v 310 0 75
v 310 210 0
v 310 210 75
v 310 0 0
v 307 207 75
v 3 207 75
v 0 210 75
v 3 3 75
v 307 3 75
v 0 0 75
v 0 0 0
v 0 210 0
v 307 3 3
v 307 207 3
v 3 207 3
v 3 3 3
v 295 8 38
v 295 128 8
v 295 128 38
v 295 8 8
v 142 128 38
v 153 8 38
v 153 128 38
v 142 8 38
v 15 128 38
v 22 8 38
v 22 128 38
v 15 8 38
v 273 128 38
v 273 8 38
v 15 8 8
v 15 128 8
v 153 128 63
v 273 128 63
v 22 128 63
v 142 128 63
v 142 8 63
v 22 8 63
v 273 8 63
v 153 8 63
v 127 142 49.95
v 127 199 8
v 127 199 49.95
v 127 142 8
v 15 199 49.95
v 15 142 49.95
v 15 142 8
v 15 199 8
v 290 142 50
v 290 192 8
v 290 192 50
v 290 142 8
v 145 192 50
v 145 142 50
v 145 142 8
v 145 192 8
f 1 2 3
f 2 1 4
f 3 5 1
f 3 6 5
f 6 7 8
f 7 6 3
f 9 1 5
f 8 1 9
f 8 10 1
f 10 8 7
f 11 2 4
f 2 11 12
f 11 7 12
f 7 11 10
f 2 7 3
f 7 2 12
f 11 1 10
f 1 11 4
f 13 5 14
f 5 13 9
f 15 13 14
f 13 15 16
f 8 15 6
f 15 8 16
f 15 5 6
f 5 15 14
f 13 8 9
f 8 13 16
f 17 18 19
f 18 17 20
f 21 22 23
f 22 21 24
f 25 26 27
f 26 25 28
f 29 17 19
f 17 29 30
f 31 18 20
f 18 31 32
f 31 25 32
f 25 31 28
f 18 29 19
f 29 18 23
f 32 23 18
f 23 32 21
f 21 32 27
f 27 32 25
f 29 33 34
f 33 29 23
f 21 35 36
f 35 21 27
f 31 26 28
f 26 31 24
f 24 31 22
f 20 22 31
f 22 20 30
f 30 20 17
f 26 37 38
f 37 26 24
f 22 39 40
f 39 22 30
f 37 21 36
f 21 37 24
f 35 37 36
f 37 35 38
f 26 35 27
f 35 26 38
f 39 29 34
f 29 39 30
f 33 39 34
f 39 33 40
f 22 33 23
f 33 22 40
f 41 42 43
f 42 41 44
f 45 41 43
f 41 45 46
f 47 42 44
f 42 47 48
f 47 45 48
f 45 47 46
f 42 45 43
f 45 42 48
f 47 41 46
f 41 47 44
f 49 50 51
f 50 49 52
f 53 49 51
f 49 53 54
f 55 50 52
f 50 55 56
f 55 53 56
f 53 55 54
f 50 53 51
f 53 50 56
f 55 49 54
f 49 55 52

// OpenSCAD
// SPDX-License-Identifier: MIT
// Copyright (c) 2026 Brandon Connell
// CGX 1 external thermal dock packing model, millimeters.
$fn = 48;

dock_l = 310;
dock_w = 210;
dock_h = 75;
wall = 3;

radiator_l = 280;
radiator_w = 120;
radiator_t = 30;
fan_l = 120;
fan_w = 120;
fan_t = 25;

pump_l = 112;
pump_w = 57;
pump_h = 41.95;

module enclosure() {
    difference() {
        color("dimgray",0.25) cube([dock_l,dock_w,dock_h]);
        translate([wall,wall,wall])
            cube([dock_l-2*wall,dock_w-2*wall,dock_h-wall]);
    }
}

module components() {
    color("silver") translate([15,8,8])
        cube([radiator_l,radiator_w,radiator_t]);

    color("black",0.75) translate([22,8,38])
        cube([fan_l,fan_w,fan_t]);
    color("black",0.75) translate([153,8,38])
        cube([fan_l,fan_w,fan_t]);

    color("blue",0.65) translate([15,142,8])
        cube([pump_l,pump_w,pump_h]);

    color("orange",0.45) translate([145,142,8])
        cube([145,50,42]);
}

enclosure();
components();
